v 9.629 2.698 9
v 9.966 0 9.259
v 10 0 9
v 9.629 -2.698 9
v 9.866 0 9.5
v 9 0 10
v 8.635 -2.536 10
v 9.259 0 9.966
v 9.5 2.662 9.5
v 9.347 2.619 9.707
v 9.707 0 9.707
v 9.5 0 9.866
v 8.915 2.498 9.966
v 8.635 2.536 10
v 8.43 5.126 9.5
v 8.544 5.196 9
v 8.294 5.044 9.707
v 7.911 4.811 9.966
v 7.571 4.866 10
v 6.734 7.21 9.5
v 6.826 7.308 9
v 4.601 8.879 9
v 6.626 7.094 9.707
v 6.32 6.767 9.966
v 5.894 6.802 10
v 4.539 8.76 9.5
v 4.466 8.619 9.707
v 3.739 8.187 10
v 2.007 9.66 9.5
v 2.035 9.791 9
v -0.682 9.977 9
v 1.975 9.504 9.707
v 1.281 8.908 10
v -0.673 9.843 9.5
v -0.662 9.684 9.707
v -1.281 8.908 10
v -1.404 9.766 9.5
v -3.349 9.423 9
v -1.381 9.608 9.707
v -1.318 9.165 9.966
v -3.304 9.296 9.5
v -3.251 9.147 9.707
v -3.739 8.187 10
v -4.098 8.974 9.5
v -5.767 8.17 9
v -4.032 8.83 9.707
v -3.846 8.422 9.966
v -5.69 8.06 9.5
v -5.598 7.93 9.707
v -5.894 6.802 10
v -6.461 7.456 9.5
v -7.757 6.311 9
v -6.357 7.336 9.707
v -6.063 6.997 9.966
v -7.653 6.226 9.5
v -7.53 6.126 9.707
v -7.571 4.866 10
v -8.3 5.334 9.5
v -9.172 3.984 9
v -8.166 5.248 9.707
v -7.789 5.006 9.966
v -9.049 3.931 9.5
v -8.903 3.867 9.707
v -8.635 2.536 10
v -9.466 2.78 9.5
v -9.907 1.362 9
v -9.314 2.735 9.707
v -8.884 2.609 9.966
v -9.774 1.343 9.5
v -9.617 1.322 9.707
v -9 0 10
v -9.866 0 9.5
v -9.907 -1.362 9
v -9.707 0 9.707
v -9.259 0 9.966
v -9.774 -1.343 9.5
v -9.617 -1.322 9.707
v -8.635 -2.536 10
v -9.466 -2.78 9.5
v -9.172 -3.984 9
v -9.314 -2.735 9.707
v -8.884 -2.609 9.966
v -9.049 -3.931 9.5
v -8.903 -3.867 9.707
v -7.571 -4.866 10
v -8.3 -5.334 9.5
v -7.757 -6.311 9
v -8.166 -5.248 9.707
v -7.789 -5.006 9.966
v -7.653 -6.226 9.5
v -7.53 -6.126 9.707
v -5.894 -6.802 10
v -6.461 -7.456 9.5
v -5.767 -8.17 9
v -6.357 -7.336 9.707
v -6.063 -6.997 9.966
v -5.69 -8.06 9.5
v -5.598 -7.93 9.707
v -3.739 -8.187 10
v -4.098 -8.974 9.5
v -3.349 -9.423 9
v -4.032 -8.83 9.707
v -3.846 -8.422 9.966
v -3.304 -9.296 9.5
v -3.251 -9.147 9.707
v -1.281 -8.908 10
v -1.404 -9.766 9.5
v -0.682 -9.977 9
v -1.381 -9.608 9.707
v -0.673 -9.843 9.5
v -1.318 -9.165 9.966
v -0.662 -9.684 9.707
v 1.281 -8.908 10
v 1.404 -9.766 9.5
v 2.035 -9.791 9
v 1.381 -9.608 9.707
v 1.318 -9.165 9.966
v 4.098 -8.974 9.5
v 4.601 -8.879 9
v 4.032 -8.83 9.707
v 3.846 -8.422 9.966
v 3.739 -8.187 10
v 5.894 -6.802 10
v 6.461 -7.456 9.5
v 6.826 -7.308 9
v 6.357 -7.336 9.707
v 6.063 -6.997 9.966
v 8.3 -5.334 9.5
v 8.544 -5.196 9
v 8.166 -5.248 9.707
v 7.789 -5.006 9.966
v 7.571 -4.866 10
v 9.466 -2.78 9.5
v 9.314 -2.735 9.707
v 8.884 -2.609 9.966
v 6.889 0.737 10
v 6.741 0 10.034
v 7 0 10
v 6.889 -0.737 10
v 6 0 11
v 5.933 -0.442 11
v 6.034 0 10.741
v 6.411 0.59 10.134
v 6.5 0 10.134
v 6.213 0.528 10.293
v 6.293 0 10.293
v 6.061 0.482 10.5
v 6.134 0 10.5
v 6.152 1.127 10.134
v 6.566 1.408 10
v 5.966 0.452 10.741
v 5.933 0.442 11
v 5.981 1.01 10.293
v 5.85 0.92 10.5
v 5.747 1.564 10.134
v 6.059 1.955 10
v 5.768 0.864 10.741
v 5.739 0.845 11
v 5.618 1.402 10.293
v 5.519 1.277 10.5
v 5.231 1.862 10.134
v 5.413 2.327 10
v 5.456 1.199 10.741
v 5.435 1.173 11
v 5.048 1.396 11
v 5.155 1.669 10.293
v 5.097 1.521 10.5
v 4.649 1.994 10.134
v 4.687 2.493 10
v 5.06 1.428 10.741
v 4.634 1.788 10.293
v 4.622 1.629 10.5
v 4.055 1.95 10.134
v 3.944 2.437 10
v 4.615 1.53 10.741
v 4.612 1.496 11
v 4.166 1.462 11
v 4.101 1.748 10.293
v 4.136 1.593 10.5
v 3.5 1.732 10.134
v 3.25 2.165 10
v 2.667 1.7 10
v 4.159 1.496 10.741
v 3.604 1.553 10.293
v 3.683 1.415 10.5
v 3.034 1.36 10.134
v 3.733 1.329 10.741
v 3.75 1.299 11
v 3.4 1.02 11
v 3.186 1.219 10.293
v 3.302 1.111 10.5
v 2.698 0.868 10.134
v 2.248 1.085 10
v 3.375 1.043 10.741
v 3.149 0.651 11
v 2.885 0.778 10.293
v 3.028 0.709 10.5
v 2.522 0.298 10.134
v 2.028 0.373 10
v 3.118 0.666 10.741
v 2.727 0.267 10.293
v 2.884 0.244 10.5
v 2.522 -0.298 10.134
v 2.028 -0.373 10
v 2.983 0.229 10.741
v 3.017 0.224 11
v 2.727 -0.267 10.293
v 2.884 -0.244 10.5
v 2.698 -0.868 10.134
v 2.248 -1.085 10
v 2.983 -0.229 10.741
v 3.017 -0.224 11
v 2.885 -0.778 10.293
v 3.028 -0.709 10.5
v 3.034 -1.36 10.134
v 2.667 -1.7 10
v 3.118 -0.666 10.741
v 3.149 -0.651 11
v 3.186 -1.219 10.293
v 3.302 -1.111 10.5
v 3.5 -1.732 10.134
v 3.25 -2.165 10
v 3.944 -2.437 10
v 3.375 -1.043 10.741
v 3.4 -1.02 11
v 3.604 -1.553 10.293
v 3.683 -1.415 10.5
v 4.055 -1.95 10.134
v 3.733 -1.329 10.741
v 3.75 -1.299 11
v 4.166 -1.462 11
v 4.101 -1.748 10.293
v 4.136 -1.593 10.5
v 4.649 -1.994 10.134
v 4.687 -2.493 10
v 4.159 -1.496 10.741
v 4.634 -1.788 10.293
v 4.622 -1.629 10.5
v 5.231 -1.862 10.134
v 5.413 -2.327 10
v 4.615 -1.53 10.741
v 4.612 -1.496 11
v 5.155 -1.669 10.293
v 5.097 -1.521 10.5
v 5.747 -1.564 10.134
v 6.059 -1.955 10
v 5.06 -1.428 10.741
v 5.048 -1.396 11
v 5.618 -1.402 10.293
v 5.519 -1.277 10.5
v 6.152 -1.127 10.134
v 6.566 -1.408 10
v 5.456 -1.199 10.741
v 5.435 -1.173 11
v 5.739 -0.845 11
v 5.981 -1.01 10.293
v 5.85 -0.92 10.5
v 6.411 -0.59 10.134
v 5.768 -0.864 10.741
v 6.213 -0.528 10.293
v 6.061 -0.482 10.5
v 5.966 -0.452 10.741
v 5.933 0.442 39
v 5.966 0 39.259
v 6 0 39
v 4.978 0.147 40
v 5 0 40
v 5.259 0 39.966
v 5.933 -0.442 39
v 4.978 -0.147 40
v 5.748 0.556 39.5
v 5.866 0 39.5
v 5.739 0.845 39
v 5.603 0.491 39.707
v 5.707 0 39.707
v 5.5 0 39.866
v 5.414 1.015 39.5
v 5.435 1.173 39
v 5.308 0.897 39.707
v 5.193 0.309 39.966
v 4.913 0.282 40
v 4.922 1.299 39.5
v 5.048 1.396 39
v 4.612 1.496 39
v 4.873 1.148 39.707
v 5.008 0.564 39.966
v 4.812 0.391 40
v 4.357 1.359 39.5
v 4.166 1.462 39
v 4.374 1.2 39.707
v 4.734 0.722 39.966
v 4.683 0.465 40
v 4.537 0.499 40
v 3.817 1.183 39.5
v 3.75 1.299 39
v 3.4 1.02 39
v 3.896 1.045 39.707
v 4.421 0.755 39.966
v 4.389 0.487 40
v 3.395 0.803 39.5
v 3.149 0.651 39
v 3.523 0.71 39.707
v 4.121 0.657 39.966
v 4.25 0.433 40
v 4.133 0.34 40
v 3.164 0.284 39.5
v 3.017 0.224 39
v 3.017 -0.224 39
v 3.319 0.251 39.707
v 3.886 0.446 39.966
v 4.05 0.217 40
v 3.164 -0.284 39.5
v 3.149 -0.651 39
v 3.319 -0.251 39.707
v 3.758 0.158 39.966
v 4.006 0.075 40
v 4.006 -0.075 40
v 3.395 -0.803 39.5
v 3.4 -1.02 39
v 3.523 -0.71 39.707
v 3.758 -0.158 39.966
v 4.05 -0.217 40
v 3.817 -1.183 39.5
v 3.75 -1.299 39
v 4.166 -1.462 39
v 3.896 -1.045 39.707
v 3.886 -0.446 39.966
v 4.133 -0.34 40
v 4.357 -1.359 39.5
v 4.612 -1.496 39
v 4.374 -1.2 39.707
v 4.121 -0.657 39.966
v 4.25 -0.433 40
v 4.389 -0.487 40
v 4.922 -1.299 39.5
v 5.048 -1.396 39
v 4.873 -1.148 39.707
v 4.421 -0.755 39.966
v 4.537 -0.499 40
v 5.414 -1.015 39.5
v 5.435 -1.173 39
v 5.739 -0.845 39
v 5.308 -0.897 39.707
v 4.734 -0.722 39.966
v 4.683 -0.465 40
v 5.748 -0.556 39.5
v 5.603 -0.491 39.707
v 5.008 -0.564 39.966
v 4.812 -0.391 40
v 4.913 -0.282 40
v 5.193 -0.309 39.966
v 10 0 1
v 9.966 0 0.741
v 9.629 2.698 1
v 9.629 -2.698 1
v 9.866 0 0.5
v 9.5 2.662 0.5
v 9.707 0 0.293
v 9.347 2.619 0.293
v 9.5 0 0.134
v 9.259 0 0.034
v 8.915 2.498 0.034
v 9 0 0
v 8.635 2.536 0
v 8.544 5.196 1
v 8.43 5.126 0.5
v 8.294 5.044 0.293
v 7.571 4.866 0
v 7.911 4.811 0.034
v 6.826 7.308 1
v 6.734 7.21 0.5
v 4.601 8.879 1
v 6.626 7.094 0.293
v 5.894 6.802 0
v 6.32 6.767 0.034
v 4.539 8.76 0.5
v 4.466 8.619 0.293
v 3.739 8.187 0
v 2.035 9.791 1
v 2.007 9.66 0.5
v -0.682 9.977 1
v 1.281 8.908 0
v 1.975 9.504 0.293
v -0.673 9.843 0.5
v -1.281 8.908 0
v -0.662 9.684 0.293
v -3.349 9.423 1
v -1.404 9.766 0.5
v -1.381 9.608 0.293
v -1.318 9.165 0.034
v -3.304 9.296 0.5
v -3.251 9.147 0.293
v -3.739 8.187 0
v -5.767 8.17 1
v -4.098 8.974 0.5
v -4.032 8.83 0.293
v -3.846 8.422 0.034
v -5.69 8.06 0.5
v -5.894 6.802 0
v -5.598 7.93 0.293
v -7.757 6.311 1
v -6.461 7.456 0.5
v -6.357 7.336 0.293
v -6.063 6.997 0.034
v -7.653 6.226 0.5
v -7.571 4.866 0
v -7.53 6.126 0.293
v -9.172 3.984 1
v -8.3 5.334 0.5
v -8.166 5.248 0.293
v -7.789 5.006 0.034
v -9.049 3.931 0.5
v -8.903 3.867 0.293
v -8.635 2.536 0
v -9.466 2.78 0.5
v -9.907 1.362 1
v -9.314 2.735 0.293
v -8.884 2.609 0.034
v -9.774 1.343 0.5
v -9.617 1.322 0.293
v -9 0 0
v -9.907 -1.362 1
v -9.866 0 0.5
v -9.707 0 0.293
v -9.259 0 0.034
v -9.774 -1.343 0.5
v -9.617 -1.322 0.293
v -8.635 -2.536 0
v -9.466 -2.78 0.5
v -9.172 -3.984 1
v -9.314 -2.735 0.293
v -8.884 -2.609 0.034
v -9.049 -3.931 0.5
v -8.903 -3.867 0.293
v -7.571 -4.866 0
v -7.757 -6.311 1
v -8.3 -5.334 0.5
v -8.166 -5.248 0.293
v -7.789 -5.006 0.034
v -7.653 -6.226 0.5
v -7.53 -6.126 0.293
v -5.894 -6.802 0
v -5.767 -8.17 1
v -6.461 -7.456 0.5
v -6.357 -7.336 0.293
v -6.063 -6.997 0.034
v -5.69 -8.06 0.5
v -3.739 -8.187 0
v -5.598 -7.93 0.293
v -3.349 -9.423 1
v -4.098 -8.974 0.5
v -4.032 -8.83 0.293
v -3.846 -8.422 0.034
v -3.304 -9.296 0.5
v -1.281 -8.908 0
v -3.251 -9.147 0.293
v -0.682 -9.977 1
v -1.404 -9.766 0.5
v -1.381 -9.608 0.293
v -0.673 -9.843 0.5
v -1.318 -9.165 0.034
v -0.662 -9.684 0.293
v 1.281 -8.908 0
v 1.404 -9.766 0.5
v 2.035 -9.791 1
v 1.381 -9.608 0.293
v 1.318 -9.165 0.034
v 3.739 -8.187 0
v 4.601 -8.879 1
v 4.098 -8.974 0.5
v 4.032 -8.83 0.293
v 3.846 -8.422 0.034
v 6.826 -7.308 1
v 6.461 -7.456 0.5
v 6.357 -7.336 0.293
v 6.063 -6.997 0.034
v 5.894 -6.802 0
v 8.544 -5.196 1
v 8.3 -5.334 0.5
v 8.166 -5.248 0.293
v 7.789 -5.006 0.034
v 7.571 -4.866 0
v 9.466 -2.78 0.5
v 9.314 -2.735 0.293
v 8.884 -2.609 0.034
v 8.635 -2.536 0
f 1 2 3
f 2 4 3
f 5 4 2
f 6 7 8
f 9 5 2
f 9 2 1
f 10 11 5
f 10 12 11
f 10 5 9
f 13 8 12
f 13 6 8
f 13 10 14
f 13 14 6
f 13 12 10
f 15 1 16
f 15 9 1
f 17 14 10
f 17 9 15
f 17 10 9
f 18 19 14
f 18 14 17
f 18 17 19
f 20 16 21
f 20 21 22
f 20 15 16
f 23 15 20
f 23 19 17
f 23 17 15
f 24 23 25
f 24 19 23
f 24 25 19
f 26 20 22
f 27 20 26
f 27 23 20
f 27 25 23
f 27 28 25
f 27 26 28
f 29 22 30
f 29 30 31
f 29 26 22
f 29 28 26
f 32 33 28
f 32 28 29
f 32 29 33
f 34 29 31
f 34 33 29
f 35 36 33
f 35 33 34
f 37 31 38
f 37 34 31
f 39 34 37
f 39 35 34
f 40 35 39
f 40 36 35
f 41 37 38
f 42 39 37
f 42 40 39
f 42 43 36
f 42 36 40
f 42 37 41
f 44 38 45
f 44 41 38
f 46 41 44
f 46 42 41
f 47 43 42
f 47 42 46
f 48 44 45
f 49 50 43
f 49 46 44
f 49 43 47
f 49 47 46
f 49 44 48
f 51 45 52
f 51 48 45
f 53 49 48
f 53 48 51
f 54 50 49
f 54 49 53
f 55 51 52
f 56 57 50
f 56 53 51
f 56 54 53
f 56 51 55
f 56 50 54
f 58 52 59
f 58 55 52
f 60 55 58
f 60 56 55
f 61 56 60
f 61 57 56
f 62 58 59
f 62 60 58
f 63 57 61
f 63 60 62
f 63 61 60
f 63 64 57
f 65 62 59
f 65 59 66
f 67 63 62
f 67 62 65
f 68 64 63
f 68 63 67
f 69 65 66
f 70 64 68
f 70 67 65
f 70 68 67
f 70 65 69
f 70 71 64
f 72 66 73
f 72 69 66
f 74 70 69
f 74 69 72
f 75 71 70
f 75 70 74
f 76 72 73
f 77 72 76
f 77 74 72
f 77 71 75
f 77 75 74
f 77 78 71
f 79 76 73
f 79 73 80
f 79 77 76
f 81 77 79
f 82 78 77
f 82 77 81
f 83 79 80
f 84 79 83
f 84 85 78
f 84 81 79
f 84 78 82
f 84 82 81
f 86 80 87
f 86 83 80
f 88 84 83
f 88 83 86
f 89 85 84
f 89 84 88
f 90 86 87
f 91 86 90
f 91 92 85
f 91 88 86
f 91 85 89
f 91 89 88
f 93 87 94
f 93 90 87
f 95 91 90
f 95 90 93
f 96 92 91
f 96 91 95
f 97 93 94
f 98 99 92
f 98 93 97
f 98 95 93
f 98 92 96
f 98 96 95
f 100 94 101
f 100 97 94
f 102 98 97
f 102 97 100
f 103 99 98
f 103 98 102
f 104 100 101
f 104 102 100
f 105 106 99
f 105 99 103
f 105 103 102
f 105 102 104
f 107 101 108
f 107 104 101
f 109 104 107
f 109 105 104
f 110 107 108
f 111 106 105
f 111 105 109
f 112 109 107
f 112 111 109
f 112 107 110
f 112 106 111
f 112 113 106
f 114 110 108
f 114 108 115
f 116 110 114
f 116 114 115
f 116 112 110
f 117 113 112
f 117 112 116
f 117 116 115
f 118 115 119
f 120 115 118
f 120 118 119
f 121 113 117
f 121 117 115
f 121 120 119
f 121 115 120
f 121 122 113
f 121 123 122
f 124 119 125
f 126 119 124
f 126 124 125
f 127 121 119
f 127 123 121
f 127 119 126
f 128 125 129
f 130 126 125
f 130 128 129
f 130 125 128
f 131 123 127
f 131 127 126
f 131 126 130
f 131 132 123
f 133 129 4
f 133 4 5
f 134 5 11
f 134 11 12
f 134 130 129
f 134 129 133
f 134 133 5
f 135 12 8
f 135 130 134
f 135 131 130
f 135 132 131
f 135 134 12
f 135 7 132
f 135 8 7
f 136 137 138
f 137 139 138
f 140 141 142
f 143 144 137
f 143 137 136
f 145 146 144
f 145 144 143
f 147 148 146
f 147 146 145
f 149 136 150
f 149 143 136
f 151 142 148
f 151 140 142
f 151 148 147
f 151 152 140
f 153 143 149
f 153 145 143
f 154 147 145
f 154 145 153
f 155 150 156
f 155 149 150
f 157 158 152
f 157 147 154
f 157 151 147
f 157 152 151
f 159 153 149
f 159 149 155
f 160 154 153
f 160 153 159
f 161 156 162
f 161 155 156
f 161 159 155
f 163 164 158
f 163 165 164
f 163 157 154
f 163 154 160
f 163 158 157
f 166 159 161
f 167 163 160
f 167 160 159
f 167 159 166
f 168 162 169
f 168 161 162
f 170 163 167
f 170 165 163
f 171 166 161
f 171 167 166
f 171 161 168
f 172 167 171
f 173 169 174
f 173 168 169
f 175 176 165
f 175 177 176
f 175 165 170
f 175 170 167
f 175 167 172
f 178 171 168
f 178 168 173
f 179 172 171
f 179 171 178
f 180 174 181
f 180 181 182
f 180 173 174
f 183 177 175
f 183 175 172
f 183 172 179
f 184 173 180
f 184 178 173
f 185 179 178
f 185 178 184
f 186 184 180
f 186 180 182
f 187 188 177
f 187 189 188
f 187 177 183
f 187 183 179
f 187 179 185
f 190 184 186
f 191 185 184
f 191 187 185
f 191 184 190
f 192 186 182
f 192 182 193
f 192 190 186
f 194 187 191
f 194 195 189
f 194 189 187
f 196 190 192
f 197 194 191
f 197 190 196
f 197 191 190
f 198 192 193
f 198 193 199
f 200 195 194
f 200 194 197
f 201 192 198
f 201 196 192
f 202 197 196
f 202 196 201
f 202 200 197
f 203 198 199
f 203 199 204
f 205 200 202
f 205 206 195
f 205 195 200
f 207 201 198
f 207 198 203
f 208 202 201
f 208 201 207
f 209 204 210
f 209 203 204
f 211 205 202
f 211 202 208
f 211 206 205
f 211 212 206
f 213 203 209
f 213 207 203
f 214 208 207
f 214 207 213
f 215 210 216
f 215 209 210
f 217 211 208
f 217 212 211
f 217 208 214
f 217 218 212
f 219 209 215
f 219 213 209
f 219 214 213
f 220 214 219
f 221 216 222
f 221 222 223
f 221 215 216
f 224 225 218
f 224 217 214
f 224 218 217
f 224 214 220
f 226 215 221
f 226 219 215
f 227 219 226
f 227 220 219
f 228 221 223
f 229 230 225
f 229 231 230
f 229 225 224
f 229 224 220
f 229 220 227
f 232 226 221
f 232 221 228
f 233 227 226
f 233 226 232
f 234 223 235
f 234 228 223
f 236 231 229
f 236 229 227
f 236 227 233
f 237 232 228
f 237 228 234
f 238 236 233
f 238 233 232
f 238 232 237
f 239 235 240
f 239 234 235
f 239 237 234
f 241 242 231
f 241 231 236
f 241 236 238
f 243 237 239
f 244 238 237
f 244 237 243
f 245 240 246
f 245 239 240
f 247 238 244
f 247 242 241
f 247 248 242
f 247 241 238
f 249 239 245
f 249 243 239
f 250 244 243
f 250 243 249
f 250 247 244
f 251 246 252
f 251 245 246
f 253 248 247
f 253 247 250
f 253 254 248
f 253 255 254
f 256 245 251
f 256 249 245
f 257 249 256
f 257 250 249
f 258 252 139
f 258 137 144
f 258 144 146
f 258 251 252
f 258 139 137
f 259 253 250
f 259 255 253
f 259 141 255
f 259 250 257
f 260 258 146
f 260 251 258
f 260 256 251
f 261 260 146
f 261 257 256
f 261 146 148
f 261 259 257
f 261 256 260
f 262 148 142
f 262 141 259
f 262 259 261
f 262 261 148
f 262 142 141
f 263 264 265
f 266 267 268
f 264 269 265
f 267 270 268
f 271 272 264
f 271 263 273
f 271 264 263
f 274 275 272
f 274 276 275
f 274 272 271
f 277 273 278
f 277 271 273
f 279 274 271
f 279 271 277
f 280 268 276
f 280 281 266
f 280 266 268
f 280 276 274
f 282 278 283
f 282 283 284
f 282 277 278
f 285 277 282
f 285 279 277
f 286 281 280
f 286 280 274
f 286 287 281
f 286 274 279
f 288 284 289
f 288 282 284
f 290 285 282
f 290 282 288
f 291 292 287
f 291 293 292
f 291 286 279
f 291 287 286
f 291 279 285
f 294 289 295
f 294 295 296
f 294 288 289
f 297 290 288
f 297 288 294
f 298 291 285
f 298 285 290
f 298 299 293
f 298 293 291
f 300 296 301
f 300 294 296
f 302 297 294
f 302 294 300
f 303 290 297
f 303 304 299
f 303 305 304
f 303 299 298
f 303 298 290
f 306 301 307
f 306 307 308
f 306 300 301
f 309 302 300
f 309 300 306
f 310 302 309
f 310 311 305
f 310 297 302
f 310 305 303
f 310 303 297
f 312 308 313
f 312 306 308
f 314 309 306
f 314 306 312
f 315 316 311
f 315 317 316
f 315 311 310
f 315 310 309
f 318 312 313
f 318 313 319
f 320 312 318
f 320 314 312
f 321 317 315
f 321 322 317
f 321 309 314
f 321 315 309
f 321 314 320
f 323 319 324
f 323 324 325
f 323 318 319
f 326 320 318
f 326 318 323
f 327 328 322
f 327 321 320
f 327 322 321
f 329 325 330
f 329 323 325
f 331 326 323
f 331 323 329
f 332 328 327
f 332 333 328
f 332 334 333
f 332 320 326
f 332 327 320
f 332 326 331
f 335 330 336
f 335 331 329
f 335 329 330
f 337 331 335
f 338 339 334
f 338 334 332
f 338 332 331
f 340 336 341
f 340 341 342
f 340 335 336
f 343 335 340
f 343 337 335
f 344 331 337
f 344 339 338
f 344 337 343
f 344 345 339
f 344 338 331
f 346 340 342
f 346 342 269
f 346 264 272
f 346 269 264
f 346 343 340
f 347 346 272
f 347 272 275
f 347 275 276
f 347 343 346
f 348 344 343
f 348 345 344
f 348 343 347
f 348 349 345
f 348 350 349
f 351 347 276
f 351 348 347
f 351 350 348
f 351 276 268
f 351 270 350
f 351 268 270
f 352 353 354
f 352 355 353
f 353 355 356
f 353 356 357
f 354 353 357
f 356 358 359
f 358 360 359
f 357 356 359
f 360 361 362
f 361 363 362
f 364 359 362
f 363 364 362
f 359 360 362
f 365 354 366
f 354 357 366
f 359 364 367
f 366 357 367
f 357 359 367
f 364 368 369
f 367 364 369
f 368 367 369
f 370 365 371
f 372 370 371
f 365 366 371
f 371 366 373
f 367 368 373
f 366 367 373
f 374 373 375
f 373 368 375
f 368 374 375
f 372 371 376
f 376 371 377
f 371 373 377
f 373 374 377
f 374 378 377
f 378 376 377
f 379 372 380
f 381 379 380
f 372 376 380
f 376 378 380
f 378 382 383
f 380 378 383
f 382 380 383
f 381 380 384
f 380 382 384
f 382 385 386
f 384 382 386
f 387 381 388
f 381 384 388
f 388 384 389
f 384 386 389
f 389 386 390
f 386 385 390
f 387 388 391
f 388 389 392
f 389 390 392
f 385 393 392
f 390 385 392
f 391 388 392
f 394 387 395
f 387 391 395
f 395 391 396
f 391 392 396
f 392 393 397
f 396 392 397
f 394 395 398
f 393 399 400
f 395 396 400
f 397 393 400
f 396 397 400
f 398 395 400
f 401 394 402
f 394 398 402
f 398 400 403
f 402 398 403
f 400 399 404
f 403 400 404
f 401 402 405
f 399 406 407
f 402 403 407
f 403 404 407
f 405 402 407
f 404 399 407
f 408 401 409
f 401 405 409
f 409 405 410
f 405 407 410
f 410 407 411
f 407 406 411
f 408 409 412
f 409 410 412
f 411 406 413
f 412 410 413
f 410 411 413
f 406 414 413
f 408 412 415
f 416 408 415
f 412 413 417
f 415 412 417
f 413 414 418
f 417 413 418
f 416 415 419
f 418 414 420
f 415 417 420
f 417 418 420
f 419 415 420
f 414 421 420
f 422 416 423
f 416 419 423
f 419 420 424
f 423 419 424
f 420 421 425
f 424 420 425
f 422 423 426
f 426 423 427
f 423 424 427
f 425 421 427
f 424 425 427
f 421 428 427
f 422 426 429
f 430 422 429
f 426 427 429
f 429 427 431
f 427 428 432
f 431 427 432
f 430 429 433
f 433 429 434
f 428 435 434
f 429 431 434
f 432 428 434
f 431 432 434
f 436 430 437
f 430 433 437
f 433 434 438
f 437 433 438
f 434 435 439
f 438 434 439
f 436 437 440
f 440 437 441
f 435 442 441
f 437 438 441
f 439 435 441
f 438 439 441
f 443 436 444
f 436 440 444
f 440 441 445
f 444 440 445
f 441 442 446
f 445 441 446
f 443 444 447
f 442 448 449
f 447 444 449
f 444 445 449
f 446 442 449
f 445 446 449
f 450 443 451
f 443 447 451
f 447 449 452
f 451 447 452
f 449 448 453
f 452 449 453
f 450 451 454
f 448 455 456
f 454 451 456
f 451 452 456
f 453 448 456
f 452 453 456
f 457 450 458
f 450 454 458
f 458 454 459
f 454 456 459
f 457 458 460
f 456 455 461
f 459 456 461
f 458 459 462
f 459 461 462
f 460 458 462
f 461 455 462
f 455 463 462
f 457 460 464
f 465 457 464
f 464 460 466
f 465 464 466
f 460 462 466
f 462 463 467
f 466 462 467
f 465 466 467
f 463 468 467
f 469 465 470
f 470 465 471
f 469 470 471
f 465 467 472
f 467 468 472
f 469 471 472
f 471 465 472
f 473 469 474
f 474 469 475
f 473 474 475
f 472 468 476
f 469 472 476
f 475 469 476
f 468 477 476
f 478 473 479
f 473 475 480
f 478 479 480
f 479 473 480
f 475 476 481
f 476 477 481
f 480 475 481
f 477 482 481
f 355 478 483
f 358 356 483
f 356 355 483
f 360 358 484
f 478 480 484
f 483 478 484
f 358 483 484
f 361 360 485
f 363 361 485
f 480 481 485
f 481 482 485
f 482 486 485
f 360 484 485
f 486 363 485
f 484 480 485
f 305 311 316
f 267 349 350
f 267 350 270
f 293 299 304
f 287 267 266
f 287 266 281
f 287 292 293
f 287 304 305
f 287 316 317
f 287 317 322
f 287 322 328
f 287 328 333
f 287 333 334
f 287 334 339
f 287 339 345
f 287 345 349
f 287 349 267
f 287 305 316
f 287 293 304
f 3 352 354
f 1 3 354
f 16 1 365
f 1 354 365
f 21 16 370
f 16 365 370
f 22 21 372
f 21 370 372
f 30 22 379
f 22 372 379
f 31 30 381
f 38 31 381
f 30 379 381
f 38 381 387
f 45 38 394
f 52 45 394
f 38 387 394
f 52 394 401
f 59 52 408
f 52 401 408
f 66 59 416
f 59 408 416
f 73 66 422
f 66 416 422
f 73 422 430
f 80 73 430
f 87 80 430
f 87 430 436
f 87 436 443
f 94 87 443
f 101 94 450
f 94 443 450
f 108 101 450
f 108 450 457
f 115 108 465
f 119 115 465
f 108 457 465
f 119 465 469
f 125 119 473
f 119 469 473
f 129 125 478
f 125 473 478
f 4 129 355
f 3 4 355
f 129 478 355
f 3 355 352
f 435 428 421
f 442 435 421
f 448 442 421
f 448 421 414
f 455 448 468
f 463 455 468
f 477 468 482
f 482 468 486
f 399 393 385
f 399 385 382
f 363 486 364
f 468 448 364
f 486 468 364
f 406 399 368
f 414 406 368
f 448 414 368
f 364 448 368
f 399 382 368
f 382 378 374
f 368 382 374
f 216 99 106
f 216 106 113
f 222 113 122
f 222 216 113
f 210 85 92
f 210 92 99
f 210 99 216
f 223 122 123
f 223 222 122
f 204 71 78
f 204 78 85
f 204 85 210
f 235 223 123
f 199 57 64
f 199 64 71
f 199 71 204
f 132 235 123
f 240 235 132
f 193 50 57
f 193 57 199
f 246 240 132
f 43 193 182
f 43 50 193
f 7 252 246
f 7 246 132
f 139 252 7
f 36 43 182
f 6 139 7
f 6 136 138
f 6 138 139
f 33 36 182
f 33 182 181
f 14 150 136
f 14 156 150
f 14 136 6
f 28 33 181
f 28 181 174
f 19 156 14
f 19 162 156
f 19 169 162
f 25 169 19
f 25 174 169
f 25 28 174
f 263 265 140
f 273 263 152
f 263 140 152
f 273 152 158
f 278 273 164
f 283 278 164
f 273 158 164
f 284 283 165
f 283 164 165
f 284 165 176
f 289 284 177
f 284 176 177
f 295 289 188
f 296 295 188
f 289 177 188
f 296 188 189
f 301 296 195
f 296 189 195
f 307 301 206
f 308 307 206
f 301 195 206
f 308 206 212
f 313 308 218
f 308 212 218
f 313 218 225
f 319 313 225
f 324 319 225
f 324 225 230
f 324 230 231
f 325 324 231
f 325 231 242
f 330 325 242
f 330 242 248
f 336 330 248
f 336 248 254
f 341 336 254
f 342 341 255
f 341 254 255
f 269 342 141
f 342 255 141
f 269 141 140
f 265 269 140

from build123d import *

# Parameters (mm, degrees)
SKETCH1_R           = 10
BOSS_EXTRUDE1_DEPTH = 10
SKETCH2_R           = 1.5
BOSS_EXTRUDE2_DEPTH = 30
FILLET1_R           = 1


with BuildPart() as part:
    # Sketch1 → Boss-Extrude1 (new body)
    with BuildSketch(Plane.XY):
        Circle(SKETCH1_R)
    extrude(amount=BOSS_EXTRUDE1_DEPTH)

    # Sketch2 → Boss-Extrude2 (add)
    with BuildSketch(Plane.XY.offset(10)):
        with Locations((4.5, 0)):
            Circle(SKETCH2_R)
    extrude(amount=BOSS_EXTRUDE2_DEPTH)

    # Fillet1
    fillet1_edges = [part.edges().sort_by_distance(p)[0] for p in [
        (-10, 0, 0),
        (-10, 0, 10),
        (3, 0, 10),
        (3, 0, 40),
    ]]
    fillet(fillet1_edges, radius=FILLET1_R)


solid = part.part
